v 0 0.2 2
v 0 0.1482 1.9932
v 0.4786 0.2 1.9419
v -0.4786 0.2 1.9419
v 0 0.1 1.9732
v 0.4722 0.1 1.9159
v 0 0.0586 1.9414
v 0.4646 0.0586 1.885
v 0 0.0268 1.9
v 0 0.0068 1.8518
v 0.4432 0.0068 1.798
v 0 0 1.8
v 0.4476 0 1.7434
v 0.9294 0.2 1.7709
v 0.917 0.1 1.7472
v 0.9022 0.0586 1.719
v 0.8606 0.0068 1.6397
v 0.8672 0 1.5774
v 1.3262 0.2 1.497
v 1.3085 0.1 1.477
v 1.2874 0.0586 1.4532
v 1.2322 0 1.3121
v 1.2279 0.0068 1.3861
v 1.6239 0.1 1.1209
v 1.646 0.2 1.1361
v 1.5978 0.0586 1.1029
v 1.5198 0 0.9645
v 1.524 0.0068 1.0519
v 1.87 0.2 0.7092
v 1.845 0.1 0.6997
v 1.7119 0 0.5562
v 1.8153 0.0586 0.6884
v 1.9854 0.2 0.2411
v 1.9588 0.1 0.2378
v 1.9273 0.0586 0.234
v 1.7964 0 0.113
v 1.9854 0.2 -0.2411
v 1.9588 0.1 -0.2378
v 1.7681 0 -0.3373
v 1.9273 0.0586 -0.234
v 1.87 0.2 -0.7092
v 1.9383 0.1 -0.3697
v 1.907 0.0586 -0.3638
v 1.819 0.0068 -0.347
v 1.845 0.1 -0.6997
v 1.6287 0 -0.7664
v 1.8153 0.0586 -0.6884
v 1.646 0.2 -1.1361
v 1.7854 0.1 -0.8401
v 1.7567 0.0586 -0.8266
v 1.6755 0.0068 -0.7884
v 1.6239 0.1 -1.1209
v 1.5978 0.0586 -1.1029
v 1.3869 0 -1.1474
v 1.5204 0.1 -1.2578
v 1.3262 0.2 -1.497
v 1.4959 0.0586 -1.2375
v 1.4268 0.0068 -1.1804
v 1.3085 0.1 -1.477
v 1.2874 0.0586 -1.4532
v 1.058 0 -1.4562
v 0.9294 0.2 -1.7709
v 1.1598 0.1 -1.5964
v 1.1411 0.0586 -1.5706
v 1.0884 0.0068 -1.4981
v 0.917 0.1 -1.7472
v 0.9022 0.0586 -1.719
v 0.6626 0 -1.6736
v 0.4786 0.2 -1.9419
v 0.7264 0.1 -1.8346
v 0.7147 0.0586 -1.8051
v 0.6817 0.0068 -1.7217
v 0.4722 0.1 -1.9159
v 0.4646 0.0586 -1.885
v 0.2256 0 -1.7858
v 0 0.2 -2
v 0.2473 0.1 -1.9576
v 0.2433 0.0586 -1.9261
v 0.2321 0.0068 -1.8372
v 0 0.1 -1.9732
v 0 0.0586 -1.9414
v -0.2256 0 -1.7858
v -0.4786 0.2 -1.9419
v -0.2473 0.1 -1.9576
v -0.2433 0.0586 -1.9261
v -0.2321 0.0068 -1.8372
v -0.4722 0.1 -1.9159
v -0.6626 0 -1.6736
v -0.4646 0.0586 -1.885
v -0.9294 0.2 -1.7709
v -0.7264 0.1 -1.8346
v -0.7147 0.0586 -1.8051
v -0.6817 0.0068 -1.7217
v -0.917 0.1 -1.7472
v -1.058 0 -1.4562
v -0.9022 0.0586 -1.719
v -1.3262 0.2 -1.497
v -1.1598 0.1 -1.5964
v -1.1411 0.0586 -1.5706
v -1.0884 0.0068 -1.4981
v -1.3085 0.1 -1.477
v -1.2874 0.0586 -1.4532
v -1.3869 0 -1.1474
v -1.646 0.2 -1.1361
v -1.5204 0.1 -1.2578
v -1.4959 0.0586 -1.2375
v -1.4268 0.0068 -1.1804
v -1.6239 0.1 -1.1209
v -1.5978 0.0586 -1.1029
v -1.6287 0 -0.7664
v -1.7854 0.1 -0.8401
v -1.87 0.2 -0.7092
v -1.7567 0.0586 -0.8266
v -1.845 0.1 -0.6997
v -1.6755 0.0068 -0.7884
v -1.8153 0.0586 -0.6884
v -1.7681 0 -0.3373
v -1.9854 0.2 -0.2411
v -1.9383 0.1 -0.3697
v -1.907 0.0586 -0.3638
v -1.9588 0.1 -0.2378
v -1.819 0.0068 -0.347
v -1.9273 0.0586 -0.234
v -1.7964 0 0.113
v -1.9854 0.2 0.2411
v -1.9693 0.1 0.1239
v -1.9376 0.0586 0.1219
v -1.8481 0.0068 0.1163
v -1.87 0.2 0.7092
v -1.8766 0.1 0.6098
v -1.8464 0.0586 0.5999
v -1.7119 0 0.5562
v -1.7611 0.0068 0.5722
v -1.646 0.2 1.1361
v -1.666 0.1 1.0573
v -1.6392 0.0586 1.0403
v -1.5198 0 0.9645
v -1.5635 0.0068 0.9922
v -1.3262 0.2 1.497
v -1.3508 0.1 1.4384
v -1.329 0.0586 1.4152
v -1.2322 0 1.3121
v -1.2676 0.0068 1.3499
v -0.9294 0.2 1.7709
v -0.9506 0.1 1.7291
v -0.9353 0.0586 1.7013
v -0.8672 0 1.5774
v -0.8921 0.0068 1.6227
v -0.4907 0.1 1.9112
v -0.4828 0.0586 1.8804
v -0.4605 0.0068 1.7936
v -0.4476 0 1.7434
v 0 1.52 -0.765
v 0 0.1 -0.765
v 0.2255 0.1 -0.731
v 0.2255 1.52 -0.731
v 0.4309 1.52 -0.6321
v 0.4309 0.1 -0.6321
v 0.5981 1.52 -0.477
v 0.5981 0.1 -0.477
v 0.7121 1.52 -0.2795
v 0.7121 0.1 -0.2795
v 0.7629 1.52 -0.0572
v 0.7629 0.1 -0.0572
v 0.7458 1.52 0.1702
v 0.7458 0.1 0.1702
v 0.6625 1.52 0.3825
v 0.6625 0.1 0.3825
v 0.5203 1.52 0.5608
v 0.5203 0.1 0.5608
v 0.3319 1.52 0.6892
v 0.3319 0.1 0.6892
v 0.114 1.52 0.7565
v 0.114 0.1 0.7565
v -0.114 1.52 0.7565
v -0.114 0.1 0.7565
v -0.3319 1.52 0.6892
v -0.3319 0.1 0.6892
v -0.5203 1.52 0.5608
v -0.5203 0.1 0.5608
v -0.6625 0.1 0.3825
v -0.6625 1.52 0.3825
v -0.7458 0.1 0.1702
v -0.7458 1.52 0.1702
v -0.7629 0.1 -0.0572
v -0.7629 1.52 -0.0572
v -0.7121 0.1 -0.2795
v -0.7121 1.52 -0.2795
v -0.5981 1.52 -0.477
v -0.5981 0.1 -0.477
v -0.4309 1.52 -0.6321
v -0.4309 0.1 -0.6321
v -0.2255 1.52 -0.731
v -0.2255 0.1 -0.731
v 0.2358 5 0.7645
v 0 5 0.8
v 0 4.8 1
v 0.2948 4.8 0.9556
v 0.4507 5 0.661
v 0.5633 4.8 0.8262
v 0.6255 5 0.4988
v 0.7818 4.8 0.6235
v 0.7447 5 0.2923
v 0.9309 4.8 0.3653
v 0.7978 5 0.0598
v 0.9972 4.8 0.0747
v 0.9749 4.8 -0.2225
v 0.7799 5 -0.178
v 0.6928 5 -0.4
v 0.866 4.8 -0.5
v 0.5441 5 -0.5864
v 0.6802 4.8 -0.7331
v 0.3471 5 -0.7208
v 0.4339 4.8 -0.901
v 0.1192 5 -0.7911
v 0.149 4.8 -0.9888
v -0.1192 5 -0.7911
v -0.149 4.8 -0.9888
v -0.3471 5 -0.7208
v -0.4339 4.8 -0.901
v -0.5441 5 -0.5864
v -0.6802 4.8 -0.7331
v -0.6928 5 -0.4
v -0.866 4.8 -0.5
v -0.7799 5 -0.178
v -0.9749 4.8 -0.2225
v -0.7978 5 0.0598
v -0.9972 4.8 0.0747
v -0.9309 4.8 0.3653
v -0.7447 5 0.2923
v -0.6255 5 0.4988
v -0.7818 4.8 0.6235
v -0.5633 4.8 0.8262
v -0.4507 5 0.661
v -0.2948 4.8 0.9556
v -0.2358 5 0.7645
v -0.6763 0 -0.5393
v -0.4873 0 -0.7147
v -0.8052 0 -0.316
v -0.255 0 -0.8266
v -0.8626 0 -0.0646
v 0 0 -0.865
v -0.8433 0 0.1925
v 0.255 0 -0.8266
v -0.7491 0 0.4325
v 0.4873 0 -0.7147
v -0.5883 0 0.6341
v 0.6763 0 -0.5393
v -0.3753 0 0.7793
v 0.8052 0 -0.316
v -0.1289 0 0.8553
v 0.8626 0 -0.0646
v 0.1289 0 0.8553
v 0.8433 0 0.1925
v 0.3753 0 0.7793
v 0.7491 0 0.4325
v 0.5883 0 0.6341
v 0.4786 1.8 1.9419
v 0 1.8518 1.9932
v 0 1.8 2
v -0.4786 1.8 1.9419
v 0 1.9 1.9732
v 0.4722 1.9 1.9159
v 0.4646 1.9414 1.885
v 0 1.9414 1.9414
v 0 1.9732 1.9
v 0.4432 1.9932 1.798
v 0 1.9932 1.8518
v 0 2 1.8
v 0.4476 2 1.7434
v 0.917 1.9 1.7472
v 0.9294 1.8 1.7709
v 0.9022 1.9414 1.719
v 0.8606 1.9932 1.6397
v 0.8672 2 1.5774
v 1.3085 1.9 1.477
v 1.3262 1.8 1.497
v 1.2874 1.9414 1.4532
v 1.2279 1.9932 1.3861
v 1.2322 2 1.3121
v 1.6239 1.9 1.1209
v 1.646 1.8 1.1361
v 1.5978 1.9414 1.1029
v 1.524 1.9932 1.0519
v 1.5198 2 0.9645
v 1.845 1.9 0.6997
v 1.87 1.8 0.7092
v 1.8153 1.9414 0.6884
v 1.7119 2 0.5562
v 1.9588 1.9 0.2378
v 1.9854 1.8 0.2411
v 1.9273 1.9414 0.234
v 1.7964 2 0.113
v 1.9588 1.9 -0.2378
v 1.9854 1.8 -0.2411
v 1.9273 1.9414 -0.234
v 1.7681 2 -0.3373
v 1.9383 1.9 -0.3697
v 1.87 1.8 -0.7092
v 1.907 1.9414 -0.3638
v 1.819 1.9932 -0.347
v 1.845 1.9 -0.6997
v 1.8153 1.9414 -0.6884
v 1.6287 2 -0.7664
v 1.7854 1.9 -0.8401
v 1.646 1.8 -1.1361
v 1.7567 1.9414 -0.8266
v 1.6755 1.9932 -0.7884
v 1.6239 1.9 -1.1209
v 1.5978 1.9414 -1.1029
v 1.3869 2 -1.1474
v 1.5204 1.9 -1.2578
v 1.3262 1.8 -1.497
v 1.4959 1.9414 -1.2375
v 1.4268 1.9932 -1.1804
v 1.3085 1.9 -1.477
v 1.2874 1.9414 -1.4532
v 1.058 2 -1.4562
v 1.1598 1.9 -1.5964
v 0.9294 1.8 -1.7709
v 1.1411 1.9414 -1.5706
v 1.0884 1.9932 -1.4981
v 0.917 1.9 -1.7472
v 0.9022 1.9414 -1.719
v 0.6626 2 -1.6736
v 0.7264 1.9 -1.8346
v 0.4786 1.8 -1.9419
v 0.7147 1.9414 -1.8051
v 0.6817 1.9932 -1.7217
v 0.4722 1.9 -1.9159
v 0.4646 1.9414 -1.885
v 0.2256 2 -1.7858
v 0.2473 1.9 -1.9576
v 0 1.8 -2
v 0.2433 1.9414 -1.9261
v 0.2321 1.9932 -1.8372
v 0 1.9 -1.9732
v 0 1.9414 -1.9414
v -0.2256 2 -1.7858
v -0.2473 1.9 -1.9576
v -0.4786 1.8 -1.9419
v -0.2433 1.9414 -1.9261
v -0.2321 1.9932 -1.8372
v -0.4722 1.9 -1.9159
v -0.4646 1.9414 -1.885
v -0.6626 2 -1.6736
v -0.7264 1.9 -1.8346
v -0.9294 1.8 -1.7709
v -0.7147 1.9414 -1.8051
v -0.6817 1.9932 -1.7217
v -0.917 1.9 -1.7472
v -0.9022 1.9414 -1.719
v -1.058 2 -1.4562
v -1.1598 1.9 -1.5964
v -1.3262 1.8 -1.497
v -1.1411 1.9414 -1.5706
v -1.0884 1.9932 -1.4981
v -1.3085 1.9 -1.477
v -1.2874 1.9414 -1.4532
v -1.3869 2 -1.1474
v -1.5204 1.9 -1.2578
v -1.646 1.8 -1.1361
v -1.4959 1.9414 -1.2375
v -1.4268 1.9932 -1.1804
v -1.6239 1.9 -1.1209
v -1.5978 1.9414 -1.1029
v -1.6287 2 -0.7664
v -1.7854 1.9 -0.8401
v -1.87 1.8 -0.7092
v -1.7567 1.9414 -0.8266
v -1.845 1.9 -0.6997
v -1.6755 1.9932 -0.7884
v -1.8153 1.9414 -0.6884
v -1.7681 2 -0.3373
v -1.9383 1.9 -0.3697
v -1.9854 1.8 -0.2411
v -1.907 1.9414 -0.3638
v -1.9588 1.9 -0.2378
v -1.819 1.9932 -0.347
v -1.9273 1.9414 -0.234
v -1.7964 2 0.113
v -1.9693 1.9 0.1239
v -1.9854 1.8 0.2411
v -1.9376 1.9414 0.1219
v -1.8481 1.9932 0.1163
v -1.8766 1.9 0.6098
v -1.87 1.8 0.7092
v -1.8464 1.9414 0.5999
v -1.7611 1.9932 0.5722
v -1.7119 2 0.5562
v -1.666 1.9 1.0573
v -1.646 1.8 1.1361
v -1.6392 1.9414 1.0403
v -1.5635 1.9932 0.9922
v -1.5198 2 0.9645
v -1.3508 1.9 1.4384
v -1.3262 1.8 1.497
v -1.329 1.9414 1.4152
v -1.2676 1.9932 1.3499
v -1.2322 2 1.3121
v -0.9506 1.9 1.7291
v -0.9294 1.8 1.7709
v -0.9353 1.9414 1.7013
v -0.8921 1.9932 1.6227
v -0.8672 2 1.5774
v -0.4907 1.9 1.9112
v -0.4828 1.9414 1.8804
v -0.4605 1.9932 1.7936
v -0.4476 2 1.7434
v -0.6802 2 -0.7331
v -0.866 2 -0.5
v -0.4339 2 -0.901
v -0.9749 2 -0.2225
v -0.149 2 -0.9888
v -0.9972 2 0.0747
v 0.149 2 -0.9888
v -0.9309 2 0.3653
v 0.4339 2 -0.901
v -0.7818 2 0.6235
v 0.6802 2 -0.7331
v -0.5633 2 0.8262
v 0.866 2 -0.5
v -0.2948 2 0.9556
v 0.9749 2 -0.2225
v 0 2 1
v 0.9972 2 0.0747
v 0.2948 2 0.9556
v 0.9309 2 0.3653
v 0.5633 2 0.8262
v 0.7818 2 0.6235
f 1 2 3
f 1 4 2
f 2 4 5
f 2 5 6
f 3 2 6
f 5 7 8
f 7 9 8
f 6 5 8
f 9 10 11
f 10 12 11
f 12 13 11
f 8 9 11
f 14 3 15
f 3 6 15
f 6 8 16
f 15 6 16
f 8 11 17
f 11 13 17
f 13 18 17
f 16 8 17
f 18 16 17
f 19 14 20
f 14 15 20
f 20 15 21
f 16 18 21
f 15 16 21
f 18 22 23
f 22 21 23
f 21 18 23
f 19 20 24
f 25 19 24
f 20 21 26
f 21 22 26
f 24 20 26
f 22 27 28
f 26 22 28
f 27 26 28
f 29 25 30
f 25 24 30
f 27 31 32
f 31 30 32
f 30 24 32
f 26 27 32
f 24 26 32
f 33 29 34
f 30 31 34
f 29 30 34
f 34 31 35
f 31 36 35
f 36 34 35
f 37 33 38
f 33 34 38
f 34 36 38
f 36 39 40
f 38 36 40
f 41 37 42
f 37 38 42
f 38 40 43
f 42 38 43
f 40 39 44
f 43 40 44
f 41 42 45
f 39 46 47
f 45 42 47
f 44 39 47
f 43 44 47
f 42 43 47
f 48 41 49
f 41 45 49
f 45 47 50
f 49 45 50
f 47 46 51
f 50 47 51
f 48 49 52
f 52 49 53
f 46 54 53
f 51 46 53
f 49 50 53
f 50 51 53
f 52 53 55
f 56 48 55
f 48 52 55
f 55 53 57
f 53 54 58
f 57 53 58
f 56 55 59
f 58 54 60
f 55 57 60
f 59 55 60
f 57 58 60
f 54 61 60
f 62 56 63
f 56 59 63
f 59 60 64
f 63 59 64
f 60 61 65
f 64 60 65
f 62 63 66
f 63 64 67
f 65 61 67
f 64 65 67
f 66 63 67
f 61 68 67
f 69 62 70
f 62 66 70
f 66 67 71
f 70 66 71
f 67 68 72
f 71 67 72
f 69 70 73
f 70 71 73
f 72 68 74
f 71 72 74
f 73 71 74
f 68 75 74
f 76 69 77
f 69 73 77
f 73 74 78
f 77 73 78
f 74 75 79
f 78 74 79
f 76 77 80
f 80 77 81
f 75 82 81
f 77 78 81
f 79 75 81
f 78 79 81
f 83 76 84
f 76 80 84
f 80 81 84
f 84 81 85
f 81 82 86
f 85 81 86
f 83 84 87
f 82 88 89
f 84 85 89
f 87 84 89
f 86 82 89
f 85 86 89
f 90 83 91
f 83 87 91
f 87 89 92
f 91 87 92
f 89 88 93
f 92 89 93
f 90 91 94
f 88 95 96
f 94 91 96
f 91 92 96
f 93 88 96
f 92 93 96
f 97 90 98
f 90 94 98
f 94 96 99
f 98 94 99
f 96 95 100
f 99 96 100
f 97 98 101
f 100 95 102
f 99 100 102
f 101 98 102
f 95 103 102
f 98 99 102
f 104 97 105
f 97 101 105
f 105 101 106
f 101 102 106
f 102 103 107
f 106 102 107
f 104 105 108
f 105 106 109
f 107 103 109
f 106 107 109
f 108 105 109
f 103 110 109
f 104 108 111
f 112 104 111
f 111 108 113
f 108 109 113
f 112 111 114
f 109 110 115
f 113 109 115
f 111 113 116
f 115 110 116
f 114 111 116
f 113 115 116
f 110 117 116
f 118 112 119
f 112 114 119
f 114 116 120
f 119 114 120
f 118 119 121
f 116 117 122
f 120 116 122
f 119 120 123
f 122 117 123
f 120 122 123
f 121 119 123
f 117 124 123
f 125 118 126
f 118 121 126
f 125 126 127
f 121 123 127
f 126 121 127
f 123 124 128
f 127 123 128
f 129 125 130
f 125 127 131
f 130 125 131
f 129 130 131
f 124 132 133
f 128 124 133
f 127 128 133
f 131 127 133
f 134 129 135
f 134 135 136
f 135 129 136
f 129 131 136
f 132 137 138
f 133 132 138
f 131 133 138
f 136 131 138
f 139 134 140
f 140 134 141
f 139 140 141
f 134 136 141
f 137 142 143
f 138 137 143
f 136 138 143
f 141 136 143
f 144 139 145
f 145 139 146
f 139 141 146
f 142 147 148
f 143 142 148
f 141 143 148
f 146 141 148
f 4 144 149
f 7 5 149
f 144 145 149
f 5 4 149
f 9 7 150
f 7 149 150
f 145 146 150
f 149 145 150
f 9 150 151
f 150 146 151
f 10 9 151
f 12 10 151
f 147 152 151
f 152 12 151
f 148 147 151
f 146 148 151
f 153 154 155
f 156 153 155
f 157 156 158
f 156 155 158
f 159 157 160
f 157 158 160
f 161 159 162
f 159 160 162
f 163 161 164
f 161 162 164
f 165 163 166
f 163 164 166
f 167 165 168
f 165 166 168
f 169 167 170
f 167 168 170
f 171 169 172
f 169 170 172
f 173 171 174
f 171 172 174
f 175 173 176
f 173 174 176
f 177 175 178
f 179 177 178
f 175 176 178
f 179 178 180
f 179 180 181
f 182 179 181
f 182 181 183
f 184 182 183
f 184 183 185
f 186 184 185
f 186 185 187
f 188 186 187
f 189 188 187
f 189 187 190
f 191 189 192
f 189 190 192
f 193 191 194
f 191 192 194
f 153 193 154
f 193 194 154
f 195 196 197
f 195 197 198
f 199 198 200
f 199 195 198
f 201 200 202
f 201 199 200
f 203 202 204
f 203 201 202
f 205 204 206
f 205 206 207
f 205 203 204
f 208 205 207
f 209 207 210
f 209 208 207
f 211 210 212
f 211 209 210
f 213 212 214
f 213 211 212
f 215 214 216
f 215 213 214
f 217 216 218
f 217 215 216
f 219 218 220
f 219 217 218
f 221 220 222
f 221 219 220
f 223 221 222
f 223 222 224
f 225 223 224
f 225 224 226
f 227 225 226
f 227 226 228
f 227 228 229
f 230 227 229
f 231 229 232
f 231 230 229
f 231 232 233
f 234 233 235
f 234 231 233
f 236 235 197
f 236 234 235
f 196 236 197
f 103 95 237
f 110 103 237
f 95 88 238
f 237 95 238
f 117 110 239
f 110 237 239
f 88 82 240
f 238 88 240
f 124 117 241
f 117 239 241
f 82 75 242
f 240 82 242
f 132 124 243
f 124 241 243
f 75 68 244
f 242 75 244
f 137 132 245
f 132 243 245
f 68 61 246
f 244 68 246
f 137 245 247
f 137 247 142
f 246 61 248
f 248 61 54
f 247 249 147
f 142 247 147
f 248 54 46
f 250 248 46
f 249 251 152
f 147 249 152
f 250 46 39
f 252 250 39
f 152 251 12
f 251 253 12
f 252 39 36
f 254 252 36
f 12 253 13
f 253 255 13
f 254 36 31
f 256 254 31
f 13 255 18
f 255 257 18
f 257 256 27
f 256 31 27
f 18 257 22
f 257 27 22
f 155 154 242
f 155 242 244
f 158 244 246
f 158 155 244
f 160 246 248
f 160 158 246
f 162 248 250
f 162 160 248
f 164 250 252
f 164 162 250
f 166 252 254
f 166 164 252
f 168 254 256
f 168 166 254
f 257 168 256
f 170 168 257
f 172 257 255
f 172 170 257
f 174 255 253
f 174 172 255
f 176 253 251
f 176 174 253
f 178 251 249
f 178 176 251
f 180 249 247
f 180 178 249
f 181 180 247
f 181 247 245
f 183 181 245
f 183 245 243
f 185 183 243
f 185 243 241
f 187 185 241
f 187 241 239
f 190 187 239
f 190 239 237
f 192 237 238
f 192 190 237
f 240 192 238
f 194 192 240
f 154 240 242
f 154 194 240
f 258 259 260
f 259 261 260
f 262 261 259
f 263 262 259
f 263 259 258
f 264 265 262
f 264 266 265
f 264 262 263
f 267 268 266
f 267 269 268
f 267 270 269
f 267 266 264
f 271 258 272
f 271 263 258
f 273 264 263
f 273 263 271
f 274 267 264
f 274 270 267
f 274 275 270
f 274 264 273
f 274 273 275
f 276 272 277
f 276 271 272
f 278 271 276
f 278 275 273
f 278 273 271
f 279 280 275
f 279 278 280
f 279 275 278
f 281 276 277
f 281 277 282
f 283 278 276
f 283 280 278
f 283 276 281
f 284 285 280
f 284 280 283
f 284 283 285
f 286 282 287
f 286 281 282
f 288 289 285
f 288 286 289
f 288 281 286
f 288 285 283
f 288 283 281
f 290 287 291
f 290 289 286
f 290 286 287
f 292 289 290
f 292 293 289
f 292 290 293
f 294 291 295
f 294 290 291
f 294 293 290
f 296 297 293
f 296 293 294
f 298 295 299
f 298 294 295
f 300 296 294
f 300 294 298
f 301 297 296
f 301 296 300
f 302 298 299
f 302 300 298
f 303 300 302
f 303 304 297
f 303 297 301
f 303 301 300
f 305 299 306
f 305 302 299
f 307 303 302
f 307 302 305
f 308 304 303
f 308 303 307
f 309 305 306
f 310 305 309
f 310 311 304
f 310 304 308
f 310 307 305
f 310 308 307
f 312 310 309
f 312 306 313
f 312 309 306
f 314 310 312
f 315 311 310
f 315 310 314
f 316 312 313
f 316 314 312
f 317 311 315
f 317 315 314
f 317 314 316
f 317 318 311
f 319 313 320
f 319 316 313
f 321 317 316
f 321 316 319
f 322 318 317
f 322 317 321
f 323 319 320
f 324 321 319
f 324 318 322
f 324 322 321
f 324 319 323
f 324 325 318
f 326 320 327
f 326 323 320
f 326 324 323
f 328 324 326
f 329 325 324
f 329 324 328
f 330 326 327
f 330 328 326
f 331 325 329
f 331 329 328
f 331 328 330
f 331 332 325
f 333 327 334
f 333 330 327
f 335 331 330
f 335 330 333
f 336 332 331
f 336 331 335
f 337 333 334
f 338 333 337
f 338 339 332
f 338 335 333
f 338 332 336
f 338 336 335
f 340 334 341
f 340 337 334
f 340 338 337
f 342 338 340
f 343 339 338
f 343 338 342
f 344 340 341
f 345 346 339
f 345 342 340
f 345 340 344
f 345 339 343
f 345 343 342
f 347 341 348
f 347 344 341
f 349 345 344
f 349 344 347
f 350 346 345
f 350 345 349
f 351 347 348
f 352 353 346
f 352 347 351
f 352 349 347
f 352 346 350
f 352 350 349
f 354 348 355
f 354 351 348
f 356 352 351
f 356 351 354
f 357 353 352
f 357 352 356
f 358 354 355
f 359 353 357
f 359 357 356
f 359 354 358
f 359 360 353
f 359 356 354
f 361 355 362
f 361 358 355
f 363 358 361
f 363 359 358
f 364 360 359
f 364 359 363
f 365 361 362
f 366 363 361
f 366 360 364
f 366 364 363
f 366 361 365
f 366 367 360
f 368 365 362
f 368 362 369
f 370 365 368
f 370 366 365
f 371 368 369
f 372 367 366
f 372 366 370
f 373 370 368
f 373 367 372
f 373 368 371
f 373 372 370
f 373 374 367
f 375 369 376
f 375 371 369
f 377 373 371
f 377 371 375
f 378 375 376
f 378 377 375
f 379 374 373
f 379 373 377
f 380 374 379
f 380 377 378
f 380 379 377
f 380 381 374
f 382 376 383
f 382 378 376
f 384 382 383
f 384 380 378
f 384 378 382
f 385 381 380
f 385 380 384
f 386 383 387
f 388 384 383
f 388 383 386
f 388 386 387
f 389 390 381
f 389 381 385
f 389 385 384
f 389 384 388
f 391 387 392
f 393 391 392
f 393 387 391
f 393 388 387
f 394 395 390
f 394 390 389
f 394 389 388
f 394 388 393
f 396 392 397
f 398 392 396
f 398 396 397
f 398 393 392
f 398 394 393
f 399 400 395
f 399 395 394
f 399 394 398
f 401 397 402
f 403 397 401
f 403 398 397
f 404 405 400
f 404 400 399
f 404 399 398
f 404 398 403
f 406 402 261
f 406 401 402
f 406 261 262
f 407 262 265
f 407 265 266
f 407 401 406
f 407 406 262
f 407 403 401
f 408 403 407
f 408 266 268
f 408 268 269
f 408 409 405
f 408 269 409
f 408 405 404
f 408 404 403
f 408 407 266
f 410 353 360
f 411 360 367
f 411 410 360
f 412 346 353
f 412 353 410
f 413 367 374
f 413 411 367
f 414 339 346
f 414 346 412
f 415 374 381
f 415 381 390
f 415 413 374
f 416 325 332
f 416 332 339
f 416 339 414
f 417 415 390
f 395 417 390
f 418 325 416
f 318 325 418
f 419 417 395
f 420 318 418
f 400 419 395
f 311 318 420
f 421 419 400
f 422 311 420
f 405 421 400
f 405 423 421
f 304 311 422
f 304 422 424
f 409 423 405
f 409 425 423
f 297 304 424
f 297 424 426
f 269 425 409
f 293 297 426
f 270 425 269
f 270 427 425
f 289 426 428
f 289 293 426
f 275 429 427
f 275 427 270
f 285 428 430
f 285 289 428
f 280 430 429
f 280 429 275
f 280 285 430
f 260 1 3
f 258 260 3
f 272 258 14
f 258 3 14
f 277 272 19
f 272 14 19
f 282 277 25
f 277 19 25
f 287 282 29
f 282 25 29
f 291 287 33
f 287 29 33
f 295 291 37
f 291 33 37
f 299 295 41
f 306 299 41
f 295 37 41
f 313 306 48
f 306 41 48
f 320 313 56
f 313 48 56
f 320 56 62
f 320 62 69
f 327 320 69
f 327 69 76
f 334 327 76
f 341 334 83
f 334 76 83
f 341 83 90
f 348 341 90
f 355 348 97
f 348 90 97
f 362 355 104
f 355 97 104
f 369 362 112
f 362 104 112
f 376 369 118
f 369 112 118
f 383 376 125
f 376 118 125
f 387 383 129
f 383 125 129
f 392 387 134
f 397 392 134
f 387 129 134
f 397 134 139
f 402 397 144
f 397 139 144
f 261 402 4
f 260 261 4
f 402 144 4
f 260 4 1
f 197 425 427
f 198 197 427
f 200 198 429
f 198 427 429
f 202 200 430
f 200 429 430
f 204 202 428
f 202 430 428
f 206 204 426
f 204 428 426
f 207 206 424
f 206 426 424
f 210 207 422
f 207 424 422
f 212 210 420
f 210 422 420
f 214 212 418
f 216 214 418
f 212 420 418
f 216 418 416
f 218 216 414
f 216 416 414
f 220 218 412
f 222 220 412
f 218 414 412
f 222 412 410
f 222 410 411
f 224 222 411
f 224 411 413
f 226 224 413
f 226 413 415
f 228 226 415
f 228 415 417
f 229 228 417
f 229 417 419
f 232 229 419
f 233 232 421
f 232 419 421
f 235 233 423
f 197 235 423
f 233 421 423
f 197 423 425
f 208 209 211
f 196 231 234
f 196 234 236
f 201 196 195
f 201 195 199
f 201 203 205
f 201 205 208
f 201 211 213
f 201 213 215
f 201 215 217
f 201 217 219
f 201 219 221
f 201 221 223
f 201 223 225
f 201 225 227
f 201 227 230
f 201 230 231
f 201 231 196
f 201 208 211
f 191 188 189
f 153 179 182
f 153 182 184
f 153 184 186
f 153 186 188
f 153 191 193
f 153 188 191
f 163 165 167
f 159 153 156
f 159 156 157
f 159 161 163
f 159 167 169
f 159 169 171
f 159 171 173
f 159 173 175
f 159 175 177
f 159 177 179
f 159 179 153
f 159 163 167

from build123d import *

# Parameters (mm, degrees)
SKETCH_2_R          = 2
EXTRUDE_1_DEPTH     = 2
SKETCH_3_R          = 1
EXTRUDE_2_DEPTH     = 3
FILLET_1_R          = 0.2
SKETCH_4_R          = 0.765
CUT_EXTRUDE_1_DEPTH = 1.52
CHAMFER_1_SIZE      = 0.1
CHAMFER_2_SIZE      = 0.2


with BuildPart() as part:
    # 草图2 → 凸台-拉伸1 (new body)
    with BuildSketch(Plane(origin=(0, 0, 0), x_dir=(1, 0, 0), z_dir=(0, 1, 0))):
        with Locations(Location((0, 0, 0), (0, 0, 270))):
            Circle(SKETCH_2_R)
    extrude(amount=EXTRUDE_1_DEPTH)

    # 草图3 → 凸台-拉伸2 (add)
    with BuildSketch(Plane(origin=(0, 2, 0), x_dir=(1, 0, 0), z_dir=(0, 1, 0))):
        with Locations(Location((0, 0, 0), (0, 0, 270))):
            Circle(SKETCH_3_R)
    extrude(amount=EXTRUDE_2_DEPTH)

    # 圆角1
    fillet_1_edges = [part.edges().sort_by_distance(p)[0] for p in [
        (0, 0, -2),
        (0, 2, -2),
    ]]
    fillet(fillet_1_edges, radius=FILLET_1_R)

    # 草图4 → 切除-拉伸1 (cut)
    with BuildSketch(Plane.XZ):
        with Locations(Location((0, 0, 0), (0, 0, 270))):
            Circle(SKETCH_4_R)
    extrude(amount=-CUT_EXTRUDE_1_DEPTH, mode=Mode.SUBTRACT)

    # 倒角1
    chamfer_1_edges = [part.edges().sort_by_distance(p)[0] for p in [
        (0, 0, 0.765),
    ]]
    chamfer(chamfer_1_edges, length=CHAMFER_1_SIZE)

    # 倒角2
    chamfer_2_edges = [part.edges().sort_by_distance(p)[0] for p in [
        (0, 5, -1),
    ]]
    chamfer(chamfer_2_edges, length=CHAMFER_2_SIZE)


solid = part.part
